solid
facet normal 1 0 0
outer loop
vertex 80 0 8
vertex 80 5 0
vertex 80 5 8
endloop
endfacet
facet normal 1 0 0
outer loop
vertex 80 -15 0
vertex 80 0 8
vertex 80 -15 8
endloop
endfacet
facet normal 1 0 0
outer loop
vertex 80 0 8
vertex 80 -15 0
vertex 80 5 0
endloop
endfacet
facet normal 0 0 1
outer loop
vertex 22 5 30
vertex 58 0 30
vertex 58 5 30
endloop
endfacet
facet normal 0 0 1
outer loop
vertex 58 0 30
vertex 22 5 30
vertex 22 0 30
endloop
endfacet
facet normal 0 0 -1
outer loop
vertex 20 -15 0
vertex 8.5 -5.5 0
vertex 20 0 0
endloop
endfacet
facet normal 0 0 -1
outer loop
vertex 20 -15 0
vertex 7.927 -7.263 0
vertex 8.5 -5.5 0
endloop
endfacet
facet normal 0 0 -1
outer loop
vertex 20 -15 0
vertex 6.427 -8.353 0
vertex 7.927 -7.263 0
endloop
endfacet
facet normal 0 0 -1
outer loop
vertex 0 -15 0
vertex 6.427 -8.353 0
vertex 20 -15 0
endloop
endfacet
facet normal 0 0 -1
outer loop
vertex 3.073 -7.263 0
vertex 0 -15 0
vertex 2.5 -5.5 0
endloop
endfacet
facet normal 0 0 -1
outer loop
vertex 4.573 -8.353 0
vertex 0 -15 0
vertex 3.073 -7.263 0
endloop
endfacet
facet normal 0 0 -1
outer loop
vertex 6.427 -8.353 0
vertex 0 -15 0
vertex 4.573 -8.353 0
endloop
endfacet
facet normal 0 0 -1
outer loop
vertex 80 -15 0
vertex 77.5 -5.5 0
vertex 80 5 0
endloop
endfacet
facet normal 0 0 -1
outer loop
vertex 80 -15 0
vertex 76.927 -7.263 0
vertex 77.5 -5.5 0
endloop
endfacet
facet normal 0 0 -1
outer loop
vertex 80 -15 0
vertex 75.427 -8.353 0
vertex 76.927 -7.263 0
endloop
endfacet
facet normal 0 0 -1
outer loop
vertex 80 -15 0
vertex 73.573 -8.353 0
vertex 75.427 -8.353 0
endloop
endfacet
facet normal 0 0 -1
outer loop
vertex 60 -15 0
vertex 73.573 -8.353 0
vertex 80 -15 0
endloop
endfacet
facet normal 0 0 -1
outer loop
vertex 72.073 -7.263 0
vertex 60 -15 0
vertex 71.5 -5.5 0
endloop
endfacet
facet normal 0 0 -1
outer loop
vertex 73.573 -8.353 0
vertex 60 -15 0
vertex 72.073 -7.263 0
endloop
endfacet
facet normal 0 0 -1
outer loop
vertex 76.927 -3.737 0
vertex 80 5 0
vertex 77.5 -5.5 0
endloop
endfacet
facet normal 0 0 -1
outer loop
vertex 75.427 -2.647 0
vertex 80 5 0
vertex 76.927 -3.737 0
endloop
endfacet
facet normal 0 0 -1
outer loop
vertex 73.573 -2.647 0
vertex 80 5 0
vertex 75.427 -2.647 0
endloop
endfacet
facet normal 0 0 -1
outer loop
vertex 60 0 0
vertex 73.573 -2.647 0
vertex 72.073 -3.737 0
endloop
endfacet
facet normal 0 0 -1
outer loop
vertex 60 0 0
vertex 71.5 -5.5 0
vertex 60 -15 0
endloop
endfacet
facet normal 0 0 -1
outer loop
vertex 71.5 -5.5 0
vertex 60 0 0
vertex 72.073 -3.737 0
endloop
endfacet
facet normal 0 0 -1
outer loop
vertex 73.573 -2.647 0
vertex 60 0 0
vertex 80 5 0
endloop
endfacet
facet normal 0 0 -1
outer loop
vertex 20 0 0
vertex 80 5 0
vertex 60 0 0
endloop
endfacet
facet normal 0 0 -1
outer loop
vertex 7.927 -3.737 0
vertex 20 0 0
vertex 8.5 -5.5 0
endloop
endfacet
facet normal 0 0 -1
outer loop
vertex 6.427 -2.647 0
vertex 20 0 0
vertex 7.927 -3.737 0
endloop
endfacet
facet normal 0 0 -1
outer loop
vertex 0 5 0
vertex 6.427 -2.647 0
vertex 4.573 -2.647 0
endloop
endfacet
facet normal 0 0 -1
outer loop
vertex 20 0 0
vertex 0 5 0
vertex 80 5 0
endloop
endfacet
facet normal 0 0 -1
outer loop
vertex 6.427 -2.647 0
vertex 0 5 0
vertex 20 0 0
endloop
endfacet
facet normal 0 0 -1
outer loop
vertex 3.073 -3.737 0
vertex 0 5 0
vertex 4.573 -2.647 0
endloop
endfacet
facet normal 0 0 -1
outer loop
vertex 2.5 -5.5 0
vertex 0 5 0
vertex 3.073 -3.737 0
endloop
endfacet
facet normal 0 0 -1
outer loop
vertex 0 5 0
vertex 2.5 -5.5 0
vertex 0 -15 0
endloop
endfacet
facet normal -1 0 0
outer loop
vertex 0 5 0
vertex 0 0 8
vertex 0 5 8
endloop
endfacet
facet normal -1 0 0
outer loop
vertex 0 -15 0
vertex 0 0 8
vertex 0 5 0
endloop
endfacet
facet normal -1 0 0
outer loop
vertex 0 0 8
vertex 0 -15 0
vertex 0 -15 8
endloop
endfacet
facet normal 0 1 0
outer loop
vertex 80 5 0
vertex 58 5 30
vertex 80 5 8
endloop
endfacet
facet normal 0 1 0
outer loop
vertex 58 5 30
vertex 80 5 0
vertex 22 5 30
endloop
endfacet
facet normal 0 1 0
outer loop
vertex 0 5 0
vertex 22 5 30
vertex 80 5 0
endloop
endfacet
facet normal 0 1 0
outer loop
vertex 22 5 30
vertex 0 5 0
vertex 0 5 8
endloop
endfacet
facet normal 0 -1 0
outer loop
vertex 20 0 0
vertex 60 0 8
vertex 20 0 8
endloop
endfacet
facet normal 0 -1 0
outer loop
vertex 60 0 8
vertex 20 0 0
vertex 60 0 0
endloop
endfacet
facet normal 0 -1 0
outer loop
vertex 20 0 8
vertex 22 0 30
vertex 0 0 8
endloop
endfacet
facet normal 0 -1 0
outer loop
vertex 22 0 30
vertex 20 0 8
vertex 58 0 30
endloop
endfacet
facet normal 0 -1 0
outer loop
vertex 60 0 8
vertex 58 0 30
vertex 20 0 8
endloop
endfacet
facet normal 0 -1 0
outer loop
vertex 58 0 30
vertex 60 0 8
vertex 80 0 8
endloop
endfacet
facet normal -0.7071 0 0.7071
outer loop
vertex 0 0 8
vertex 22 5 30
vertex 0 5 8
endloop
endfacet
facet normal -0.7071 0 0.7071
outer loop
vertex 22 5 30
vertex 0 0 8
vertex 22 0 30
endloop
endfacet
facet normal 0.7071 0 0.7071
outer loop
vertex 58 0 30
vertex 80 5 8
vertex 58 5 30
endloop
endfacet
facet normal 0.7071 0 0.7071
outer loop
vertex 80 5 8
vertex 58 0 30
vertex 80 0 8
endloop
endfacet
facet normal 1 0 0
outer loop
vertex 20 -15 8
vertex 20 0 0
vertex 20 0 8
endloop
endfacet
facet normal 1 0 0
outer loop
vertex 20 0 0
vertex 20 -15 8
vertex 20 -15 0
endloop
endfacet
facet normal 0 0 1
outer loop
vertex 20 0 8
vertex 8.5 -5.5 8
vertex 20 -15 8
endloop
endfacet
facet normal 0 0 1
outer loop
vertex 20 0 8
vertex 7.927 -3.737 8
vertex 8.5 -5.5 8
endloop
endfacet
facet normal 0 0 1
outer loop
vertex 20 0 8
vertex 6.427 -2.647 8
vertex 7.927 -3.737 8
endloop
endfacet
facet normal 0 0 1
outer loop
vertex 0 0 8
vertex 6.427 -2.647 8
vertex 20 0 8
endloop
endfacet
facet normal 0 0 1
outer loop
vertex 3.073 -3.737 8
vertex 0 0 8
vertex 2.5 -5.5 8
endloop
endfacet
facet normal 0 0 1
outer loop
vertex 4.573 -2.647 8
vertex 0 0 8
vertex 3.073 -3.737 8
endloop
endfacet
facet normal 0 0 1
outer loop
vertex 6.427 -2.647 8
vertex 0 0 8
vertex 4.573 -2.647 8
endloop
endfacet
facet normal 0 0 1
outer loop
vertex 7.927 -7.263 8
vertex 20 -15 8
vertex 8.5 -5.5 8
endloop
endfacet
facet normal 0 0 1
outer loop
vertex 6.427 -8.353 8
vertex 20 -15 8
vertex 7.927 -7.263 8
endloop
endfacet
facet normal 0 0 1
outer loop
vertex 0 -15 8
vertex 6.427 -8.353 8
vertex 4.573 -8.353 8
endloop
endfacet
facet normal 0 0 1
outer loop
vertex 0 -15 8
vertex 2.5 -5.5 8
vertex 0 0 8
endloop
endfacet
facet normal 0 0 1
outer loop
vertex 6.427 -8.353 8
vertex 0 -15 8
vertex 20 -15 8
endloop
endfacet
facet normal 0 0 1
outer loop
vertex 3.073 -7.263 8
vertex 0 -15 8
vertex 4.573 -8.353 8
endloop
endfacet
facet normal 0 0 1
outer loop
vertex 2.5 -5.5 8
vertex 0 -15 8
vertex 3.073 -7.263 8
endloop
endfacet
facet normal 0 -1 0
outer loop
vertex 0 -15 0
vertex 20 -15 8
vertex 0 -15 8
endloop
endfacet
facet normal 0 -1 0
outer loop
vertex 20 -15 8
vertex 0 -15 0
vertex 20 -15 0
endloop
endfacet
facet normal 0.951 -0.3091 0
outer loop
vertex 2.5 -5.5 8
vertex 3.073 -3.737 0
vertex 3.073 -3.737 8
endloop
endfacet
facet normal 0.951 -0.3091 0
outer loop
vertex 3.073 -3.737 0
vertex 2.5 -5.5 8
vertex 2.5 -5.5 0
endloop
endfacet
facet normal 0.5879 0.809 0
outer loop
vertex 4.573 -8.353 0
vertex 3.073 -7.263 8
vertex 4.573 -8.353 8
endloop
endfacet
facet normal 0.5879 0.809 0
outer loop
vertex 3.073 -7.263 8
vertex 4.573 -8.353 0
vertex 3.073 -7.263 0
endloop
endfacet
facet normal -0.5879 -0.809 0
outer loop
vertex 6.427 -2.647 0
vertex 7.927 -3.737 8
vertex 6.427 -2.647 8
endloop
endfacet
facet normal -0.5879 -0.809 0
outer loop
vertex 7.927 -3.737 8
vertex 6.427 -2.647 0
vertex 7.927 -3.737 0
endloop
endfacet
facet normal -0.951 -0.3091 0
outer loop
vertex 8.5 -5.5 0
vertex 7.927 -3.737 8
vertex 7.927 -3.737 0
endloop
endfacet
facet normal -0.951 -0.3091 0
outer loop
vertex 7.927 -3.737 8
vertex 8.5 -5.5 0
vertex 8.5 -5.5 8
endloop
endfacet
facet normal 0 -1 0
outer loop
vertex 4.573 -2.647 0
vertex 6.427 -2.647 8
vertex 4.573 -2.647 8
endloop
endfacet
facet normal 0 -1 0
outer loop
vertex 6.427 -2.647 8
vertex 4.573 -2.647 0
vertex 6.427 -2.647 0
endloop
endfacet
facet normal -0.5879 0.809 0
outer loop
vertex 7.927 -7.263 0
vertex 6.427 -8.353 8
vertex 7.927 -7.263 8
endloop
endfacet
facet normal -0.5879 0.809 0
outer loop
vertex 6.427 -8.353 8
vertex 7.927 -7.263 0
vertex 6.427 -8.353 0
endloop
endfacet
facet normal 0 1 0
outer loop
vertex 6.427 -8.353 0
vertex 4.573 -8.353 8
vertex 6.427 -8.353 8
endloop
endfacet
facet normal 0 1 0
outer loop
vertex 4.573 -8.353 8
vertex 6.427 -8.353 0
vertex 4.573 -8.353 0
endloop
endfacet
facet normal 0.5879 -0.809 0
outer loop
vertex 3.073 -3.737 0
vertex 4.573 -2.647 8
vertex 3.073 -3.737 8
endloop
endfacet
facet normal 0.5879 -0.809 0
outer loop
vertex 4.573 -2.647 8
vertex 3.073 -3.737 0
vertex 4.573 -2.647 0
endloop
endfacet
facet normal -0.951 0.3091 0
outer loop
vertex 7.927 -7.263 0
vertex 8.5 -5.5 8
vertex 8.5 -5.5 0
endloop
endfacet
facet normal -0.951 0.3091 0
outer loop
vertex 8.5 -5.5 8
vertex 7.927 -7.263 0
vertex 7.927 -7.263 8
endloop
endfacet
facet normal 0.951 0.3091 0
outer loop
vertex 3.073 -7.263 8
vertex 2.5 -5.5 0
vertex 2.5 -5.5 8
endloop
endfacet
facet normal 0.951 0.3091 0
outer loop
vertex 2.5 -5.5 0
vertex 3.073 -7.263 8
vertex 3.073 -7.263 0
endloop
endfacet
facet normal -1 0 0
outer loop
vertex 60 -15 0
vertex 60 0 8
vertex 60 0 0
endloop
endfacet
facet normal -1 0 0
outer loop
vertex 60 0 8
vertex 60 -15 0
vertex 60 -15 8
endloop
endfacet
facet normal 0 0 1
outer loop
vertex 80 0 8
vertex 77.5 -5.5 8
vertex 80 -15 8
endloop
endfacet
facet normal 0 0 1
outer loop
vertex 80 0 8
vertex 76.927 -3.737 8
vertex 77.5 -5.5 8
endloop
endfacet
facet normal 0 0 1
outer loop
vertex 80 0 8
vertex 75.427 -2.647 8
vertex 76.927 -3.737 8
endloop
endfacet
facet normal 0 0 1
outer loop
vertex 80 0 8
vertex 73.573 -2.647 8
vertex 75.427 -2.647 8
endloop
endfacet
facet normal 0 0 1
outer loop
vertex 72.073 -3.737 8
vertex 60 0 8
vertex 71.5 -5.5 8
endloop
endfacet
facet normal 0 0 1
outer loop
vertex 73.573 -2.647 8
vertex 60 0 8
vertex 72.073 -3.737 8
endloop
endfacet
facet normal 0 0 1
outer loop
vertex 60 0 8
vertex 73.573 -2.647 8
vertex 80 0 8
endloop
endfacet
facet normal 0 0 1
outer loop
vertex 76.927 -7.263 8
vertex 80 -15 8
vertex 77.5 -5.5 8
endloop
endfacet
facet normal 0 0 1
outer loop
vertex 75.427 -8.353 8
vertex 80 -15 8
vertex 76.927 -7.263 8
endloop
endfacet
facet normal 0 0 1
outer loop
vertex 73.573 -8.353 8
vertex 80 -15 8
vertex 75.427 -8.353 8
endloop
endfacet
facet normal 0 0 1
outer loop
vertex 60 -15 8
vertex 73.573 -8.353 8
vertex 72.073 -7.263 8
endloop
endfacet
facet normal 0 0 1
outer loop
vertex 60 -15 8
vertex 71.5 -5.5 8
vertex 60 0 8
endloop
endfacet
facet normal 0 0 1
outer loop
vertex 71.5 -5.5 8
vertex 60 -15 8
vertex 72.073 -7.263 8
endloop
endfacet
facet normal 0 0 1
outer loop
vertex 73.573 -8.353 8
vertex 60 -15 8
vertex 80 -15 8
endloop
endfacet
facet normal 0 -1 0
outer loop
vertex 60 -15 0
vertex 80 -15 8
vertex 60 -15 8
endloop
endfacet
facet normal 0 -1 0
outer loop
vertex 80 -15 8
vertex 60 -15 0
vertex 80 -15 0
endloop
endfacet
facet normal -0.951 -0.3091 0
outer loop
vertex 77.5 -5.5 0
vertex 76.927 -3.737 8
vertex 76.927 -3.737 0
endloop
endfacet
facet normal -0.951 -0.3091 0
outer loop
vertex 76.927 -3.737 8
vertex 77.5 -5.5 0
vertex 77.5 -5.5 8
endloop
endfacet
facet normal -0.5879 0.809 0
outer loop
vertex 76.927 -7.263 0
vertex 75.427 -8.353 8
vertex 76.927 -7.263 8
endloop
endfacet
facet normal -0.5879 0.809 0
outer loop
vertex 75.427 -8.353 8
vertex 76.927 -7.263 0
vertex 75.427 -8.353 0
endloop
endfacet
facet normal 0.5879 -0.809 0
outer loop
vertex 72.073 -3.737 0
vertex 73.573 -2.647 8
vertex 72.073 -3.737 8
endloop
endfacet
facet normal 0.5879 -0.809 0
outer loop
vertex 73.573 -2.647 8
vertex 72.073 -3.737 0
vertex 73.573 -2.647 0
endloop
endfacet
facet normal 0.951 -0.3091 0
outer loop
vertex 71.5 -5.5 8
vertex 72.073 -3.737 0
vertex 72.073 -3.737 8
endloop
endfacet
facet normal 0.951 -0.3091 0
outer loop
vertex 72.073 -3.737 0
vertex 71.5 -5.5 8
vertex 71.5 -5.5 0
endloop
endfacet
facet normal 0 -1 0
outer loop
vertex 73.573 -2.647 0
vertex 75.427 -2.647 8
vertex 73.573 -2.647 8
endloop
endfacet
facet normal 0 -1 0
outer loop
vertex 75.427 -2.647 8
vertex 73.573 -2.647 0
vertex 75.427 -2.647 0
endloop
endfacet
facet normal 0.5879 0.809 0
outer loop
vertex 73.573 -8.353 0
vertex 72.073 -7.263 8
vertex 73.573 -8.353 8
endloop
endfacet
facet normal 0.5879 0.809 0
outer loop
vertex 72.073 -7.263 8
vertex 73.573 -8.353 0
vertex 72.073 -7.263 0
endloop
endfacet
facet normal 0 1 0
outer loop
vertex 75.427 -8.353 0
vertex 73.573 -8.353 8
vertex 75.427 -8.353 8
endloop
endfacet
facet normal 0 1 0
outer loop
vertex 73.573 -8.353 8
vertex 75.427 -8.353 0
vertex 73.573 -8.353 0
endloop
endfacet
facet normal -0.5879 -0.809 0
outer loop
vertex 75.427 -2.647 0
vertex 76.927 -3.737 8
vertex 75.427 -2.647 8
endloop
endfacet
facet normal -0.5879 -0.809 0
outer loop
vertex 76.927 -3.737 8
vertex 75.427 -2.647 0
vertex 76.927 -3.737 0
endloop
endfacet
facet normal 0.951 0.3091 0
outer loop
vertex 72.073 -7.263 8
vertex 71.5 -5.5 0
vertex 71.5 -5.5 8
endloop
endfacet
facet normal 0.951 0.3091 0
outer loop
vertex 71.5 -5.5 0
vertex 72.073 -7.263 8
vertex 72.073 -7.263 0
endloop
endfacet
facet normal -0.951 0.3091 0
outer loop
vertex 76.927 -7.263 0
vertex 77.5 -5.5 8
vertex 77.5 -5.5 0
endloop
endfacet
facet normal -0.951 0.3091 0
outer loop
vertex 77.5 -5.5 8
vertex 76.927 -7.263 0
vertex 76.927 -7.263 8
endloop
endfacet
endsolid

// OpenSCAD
thickness = 5;
height = 30;
width = 80;

mount_width = 20;
mount_depth = 15;
mount_thickness = 8;

m3_diameter = 3;

module mount() {
	difference() {
		cube([mount_width, mount_depth, mount_thickness]);
		translate([4+m3_diameter/2, mount_depth-4-m3_diameter/2, 0])
		# cylinder(mount_thickness, m3_diameter, m3_diameter);
	}
}

module base() {
	union() {
		// Main Hexagon
		difference() {
			cube([width, thickness, height]);					// main rectangle
			translate([0, 0, 8])										// cut off left corner
			rotate([0, -45, 0])
			#cube([height+2, thickness, height/2+1]);
			translate([width, 0, 8])								// cut off right corner
			rotate([0, -45, 0])
			#cube([height/2+1, thickness, height+2]);
		}

		// L. Mount
		translate([0, -mount_depth, 0])
		mount();

		// R. Mount
		translate([width, -mount_depth, mount_thickness])
		rotate([0, 180, 0])
		mount();
	}
}

base();
